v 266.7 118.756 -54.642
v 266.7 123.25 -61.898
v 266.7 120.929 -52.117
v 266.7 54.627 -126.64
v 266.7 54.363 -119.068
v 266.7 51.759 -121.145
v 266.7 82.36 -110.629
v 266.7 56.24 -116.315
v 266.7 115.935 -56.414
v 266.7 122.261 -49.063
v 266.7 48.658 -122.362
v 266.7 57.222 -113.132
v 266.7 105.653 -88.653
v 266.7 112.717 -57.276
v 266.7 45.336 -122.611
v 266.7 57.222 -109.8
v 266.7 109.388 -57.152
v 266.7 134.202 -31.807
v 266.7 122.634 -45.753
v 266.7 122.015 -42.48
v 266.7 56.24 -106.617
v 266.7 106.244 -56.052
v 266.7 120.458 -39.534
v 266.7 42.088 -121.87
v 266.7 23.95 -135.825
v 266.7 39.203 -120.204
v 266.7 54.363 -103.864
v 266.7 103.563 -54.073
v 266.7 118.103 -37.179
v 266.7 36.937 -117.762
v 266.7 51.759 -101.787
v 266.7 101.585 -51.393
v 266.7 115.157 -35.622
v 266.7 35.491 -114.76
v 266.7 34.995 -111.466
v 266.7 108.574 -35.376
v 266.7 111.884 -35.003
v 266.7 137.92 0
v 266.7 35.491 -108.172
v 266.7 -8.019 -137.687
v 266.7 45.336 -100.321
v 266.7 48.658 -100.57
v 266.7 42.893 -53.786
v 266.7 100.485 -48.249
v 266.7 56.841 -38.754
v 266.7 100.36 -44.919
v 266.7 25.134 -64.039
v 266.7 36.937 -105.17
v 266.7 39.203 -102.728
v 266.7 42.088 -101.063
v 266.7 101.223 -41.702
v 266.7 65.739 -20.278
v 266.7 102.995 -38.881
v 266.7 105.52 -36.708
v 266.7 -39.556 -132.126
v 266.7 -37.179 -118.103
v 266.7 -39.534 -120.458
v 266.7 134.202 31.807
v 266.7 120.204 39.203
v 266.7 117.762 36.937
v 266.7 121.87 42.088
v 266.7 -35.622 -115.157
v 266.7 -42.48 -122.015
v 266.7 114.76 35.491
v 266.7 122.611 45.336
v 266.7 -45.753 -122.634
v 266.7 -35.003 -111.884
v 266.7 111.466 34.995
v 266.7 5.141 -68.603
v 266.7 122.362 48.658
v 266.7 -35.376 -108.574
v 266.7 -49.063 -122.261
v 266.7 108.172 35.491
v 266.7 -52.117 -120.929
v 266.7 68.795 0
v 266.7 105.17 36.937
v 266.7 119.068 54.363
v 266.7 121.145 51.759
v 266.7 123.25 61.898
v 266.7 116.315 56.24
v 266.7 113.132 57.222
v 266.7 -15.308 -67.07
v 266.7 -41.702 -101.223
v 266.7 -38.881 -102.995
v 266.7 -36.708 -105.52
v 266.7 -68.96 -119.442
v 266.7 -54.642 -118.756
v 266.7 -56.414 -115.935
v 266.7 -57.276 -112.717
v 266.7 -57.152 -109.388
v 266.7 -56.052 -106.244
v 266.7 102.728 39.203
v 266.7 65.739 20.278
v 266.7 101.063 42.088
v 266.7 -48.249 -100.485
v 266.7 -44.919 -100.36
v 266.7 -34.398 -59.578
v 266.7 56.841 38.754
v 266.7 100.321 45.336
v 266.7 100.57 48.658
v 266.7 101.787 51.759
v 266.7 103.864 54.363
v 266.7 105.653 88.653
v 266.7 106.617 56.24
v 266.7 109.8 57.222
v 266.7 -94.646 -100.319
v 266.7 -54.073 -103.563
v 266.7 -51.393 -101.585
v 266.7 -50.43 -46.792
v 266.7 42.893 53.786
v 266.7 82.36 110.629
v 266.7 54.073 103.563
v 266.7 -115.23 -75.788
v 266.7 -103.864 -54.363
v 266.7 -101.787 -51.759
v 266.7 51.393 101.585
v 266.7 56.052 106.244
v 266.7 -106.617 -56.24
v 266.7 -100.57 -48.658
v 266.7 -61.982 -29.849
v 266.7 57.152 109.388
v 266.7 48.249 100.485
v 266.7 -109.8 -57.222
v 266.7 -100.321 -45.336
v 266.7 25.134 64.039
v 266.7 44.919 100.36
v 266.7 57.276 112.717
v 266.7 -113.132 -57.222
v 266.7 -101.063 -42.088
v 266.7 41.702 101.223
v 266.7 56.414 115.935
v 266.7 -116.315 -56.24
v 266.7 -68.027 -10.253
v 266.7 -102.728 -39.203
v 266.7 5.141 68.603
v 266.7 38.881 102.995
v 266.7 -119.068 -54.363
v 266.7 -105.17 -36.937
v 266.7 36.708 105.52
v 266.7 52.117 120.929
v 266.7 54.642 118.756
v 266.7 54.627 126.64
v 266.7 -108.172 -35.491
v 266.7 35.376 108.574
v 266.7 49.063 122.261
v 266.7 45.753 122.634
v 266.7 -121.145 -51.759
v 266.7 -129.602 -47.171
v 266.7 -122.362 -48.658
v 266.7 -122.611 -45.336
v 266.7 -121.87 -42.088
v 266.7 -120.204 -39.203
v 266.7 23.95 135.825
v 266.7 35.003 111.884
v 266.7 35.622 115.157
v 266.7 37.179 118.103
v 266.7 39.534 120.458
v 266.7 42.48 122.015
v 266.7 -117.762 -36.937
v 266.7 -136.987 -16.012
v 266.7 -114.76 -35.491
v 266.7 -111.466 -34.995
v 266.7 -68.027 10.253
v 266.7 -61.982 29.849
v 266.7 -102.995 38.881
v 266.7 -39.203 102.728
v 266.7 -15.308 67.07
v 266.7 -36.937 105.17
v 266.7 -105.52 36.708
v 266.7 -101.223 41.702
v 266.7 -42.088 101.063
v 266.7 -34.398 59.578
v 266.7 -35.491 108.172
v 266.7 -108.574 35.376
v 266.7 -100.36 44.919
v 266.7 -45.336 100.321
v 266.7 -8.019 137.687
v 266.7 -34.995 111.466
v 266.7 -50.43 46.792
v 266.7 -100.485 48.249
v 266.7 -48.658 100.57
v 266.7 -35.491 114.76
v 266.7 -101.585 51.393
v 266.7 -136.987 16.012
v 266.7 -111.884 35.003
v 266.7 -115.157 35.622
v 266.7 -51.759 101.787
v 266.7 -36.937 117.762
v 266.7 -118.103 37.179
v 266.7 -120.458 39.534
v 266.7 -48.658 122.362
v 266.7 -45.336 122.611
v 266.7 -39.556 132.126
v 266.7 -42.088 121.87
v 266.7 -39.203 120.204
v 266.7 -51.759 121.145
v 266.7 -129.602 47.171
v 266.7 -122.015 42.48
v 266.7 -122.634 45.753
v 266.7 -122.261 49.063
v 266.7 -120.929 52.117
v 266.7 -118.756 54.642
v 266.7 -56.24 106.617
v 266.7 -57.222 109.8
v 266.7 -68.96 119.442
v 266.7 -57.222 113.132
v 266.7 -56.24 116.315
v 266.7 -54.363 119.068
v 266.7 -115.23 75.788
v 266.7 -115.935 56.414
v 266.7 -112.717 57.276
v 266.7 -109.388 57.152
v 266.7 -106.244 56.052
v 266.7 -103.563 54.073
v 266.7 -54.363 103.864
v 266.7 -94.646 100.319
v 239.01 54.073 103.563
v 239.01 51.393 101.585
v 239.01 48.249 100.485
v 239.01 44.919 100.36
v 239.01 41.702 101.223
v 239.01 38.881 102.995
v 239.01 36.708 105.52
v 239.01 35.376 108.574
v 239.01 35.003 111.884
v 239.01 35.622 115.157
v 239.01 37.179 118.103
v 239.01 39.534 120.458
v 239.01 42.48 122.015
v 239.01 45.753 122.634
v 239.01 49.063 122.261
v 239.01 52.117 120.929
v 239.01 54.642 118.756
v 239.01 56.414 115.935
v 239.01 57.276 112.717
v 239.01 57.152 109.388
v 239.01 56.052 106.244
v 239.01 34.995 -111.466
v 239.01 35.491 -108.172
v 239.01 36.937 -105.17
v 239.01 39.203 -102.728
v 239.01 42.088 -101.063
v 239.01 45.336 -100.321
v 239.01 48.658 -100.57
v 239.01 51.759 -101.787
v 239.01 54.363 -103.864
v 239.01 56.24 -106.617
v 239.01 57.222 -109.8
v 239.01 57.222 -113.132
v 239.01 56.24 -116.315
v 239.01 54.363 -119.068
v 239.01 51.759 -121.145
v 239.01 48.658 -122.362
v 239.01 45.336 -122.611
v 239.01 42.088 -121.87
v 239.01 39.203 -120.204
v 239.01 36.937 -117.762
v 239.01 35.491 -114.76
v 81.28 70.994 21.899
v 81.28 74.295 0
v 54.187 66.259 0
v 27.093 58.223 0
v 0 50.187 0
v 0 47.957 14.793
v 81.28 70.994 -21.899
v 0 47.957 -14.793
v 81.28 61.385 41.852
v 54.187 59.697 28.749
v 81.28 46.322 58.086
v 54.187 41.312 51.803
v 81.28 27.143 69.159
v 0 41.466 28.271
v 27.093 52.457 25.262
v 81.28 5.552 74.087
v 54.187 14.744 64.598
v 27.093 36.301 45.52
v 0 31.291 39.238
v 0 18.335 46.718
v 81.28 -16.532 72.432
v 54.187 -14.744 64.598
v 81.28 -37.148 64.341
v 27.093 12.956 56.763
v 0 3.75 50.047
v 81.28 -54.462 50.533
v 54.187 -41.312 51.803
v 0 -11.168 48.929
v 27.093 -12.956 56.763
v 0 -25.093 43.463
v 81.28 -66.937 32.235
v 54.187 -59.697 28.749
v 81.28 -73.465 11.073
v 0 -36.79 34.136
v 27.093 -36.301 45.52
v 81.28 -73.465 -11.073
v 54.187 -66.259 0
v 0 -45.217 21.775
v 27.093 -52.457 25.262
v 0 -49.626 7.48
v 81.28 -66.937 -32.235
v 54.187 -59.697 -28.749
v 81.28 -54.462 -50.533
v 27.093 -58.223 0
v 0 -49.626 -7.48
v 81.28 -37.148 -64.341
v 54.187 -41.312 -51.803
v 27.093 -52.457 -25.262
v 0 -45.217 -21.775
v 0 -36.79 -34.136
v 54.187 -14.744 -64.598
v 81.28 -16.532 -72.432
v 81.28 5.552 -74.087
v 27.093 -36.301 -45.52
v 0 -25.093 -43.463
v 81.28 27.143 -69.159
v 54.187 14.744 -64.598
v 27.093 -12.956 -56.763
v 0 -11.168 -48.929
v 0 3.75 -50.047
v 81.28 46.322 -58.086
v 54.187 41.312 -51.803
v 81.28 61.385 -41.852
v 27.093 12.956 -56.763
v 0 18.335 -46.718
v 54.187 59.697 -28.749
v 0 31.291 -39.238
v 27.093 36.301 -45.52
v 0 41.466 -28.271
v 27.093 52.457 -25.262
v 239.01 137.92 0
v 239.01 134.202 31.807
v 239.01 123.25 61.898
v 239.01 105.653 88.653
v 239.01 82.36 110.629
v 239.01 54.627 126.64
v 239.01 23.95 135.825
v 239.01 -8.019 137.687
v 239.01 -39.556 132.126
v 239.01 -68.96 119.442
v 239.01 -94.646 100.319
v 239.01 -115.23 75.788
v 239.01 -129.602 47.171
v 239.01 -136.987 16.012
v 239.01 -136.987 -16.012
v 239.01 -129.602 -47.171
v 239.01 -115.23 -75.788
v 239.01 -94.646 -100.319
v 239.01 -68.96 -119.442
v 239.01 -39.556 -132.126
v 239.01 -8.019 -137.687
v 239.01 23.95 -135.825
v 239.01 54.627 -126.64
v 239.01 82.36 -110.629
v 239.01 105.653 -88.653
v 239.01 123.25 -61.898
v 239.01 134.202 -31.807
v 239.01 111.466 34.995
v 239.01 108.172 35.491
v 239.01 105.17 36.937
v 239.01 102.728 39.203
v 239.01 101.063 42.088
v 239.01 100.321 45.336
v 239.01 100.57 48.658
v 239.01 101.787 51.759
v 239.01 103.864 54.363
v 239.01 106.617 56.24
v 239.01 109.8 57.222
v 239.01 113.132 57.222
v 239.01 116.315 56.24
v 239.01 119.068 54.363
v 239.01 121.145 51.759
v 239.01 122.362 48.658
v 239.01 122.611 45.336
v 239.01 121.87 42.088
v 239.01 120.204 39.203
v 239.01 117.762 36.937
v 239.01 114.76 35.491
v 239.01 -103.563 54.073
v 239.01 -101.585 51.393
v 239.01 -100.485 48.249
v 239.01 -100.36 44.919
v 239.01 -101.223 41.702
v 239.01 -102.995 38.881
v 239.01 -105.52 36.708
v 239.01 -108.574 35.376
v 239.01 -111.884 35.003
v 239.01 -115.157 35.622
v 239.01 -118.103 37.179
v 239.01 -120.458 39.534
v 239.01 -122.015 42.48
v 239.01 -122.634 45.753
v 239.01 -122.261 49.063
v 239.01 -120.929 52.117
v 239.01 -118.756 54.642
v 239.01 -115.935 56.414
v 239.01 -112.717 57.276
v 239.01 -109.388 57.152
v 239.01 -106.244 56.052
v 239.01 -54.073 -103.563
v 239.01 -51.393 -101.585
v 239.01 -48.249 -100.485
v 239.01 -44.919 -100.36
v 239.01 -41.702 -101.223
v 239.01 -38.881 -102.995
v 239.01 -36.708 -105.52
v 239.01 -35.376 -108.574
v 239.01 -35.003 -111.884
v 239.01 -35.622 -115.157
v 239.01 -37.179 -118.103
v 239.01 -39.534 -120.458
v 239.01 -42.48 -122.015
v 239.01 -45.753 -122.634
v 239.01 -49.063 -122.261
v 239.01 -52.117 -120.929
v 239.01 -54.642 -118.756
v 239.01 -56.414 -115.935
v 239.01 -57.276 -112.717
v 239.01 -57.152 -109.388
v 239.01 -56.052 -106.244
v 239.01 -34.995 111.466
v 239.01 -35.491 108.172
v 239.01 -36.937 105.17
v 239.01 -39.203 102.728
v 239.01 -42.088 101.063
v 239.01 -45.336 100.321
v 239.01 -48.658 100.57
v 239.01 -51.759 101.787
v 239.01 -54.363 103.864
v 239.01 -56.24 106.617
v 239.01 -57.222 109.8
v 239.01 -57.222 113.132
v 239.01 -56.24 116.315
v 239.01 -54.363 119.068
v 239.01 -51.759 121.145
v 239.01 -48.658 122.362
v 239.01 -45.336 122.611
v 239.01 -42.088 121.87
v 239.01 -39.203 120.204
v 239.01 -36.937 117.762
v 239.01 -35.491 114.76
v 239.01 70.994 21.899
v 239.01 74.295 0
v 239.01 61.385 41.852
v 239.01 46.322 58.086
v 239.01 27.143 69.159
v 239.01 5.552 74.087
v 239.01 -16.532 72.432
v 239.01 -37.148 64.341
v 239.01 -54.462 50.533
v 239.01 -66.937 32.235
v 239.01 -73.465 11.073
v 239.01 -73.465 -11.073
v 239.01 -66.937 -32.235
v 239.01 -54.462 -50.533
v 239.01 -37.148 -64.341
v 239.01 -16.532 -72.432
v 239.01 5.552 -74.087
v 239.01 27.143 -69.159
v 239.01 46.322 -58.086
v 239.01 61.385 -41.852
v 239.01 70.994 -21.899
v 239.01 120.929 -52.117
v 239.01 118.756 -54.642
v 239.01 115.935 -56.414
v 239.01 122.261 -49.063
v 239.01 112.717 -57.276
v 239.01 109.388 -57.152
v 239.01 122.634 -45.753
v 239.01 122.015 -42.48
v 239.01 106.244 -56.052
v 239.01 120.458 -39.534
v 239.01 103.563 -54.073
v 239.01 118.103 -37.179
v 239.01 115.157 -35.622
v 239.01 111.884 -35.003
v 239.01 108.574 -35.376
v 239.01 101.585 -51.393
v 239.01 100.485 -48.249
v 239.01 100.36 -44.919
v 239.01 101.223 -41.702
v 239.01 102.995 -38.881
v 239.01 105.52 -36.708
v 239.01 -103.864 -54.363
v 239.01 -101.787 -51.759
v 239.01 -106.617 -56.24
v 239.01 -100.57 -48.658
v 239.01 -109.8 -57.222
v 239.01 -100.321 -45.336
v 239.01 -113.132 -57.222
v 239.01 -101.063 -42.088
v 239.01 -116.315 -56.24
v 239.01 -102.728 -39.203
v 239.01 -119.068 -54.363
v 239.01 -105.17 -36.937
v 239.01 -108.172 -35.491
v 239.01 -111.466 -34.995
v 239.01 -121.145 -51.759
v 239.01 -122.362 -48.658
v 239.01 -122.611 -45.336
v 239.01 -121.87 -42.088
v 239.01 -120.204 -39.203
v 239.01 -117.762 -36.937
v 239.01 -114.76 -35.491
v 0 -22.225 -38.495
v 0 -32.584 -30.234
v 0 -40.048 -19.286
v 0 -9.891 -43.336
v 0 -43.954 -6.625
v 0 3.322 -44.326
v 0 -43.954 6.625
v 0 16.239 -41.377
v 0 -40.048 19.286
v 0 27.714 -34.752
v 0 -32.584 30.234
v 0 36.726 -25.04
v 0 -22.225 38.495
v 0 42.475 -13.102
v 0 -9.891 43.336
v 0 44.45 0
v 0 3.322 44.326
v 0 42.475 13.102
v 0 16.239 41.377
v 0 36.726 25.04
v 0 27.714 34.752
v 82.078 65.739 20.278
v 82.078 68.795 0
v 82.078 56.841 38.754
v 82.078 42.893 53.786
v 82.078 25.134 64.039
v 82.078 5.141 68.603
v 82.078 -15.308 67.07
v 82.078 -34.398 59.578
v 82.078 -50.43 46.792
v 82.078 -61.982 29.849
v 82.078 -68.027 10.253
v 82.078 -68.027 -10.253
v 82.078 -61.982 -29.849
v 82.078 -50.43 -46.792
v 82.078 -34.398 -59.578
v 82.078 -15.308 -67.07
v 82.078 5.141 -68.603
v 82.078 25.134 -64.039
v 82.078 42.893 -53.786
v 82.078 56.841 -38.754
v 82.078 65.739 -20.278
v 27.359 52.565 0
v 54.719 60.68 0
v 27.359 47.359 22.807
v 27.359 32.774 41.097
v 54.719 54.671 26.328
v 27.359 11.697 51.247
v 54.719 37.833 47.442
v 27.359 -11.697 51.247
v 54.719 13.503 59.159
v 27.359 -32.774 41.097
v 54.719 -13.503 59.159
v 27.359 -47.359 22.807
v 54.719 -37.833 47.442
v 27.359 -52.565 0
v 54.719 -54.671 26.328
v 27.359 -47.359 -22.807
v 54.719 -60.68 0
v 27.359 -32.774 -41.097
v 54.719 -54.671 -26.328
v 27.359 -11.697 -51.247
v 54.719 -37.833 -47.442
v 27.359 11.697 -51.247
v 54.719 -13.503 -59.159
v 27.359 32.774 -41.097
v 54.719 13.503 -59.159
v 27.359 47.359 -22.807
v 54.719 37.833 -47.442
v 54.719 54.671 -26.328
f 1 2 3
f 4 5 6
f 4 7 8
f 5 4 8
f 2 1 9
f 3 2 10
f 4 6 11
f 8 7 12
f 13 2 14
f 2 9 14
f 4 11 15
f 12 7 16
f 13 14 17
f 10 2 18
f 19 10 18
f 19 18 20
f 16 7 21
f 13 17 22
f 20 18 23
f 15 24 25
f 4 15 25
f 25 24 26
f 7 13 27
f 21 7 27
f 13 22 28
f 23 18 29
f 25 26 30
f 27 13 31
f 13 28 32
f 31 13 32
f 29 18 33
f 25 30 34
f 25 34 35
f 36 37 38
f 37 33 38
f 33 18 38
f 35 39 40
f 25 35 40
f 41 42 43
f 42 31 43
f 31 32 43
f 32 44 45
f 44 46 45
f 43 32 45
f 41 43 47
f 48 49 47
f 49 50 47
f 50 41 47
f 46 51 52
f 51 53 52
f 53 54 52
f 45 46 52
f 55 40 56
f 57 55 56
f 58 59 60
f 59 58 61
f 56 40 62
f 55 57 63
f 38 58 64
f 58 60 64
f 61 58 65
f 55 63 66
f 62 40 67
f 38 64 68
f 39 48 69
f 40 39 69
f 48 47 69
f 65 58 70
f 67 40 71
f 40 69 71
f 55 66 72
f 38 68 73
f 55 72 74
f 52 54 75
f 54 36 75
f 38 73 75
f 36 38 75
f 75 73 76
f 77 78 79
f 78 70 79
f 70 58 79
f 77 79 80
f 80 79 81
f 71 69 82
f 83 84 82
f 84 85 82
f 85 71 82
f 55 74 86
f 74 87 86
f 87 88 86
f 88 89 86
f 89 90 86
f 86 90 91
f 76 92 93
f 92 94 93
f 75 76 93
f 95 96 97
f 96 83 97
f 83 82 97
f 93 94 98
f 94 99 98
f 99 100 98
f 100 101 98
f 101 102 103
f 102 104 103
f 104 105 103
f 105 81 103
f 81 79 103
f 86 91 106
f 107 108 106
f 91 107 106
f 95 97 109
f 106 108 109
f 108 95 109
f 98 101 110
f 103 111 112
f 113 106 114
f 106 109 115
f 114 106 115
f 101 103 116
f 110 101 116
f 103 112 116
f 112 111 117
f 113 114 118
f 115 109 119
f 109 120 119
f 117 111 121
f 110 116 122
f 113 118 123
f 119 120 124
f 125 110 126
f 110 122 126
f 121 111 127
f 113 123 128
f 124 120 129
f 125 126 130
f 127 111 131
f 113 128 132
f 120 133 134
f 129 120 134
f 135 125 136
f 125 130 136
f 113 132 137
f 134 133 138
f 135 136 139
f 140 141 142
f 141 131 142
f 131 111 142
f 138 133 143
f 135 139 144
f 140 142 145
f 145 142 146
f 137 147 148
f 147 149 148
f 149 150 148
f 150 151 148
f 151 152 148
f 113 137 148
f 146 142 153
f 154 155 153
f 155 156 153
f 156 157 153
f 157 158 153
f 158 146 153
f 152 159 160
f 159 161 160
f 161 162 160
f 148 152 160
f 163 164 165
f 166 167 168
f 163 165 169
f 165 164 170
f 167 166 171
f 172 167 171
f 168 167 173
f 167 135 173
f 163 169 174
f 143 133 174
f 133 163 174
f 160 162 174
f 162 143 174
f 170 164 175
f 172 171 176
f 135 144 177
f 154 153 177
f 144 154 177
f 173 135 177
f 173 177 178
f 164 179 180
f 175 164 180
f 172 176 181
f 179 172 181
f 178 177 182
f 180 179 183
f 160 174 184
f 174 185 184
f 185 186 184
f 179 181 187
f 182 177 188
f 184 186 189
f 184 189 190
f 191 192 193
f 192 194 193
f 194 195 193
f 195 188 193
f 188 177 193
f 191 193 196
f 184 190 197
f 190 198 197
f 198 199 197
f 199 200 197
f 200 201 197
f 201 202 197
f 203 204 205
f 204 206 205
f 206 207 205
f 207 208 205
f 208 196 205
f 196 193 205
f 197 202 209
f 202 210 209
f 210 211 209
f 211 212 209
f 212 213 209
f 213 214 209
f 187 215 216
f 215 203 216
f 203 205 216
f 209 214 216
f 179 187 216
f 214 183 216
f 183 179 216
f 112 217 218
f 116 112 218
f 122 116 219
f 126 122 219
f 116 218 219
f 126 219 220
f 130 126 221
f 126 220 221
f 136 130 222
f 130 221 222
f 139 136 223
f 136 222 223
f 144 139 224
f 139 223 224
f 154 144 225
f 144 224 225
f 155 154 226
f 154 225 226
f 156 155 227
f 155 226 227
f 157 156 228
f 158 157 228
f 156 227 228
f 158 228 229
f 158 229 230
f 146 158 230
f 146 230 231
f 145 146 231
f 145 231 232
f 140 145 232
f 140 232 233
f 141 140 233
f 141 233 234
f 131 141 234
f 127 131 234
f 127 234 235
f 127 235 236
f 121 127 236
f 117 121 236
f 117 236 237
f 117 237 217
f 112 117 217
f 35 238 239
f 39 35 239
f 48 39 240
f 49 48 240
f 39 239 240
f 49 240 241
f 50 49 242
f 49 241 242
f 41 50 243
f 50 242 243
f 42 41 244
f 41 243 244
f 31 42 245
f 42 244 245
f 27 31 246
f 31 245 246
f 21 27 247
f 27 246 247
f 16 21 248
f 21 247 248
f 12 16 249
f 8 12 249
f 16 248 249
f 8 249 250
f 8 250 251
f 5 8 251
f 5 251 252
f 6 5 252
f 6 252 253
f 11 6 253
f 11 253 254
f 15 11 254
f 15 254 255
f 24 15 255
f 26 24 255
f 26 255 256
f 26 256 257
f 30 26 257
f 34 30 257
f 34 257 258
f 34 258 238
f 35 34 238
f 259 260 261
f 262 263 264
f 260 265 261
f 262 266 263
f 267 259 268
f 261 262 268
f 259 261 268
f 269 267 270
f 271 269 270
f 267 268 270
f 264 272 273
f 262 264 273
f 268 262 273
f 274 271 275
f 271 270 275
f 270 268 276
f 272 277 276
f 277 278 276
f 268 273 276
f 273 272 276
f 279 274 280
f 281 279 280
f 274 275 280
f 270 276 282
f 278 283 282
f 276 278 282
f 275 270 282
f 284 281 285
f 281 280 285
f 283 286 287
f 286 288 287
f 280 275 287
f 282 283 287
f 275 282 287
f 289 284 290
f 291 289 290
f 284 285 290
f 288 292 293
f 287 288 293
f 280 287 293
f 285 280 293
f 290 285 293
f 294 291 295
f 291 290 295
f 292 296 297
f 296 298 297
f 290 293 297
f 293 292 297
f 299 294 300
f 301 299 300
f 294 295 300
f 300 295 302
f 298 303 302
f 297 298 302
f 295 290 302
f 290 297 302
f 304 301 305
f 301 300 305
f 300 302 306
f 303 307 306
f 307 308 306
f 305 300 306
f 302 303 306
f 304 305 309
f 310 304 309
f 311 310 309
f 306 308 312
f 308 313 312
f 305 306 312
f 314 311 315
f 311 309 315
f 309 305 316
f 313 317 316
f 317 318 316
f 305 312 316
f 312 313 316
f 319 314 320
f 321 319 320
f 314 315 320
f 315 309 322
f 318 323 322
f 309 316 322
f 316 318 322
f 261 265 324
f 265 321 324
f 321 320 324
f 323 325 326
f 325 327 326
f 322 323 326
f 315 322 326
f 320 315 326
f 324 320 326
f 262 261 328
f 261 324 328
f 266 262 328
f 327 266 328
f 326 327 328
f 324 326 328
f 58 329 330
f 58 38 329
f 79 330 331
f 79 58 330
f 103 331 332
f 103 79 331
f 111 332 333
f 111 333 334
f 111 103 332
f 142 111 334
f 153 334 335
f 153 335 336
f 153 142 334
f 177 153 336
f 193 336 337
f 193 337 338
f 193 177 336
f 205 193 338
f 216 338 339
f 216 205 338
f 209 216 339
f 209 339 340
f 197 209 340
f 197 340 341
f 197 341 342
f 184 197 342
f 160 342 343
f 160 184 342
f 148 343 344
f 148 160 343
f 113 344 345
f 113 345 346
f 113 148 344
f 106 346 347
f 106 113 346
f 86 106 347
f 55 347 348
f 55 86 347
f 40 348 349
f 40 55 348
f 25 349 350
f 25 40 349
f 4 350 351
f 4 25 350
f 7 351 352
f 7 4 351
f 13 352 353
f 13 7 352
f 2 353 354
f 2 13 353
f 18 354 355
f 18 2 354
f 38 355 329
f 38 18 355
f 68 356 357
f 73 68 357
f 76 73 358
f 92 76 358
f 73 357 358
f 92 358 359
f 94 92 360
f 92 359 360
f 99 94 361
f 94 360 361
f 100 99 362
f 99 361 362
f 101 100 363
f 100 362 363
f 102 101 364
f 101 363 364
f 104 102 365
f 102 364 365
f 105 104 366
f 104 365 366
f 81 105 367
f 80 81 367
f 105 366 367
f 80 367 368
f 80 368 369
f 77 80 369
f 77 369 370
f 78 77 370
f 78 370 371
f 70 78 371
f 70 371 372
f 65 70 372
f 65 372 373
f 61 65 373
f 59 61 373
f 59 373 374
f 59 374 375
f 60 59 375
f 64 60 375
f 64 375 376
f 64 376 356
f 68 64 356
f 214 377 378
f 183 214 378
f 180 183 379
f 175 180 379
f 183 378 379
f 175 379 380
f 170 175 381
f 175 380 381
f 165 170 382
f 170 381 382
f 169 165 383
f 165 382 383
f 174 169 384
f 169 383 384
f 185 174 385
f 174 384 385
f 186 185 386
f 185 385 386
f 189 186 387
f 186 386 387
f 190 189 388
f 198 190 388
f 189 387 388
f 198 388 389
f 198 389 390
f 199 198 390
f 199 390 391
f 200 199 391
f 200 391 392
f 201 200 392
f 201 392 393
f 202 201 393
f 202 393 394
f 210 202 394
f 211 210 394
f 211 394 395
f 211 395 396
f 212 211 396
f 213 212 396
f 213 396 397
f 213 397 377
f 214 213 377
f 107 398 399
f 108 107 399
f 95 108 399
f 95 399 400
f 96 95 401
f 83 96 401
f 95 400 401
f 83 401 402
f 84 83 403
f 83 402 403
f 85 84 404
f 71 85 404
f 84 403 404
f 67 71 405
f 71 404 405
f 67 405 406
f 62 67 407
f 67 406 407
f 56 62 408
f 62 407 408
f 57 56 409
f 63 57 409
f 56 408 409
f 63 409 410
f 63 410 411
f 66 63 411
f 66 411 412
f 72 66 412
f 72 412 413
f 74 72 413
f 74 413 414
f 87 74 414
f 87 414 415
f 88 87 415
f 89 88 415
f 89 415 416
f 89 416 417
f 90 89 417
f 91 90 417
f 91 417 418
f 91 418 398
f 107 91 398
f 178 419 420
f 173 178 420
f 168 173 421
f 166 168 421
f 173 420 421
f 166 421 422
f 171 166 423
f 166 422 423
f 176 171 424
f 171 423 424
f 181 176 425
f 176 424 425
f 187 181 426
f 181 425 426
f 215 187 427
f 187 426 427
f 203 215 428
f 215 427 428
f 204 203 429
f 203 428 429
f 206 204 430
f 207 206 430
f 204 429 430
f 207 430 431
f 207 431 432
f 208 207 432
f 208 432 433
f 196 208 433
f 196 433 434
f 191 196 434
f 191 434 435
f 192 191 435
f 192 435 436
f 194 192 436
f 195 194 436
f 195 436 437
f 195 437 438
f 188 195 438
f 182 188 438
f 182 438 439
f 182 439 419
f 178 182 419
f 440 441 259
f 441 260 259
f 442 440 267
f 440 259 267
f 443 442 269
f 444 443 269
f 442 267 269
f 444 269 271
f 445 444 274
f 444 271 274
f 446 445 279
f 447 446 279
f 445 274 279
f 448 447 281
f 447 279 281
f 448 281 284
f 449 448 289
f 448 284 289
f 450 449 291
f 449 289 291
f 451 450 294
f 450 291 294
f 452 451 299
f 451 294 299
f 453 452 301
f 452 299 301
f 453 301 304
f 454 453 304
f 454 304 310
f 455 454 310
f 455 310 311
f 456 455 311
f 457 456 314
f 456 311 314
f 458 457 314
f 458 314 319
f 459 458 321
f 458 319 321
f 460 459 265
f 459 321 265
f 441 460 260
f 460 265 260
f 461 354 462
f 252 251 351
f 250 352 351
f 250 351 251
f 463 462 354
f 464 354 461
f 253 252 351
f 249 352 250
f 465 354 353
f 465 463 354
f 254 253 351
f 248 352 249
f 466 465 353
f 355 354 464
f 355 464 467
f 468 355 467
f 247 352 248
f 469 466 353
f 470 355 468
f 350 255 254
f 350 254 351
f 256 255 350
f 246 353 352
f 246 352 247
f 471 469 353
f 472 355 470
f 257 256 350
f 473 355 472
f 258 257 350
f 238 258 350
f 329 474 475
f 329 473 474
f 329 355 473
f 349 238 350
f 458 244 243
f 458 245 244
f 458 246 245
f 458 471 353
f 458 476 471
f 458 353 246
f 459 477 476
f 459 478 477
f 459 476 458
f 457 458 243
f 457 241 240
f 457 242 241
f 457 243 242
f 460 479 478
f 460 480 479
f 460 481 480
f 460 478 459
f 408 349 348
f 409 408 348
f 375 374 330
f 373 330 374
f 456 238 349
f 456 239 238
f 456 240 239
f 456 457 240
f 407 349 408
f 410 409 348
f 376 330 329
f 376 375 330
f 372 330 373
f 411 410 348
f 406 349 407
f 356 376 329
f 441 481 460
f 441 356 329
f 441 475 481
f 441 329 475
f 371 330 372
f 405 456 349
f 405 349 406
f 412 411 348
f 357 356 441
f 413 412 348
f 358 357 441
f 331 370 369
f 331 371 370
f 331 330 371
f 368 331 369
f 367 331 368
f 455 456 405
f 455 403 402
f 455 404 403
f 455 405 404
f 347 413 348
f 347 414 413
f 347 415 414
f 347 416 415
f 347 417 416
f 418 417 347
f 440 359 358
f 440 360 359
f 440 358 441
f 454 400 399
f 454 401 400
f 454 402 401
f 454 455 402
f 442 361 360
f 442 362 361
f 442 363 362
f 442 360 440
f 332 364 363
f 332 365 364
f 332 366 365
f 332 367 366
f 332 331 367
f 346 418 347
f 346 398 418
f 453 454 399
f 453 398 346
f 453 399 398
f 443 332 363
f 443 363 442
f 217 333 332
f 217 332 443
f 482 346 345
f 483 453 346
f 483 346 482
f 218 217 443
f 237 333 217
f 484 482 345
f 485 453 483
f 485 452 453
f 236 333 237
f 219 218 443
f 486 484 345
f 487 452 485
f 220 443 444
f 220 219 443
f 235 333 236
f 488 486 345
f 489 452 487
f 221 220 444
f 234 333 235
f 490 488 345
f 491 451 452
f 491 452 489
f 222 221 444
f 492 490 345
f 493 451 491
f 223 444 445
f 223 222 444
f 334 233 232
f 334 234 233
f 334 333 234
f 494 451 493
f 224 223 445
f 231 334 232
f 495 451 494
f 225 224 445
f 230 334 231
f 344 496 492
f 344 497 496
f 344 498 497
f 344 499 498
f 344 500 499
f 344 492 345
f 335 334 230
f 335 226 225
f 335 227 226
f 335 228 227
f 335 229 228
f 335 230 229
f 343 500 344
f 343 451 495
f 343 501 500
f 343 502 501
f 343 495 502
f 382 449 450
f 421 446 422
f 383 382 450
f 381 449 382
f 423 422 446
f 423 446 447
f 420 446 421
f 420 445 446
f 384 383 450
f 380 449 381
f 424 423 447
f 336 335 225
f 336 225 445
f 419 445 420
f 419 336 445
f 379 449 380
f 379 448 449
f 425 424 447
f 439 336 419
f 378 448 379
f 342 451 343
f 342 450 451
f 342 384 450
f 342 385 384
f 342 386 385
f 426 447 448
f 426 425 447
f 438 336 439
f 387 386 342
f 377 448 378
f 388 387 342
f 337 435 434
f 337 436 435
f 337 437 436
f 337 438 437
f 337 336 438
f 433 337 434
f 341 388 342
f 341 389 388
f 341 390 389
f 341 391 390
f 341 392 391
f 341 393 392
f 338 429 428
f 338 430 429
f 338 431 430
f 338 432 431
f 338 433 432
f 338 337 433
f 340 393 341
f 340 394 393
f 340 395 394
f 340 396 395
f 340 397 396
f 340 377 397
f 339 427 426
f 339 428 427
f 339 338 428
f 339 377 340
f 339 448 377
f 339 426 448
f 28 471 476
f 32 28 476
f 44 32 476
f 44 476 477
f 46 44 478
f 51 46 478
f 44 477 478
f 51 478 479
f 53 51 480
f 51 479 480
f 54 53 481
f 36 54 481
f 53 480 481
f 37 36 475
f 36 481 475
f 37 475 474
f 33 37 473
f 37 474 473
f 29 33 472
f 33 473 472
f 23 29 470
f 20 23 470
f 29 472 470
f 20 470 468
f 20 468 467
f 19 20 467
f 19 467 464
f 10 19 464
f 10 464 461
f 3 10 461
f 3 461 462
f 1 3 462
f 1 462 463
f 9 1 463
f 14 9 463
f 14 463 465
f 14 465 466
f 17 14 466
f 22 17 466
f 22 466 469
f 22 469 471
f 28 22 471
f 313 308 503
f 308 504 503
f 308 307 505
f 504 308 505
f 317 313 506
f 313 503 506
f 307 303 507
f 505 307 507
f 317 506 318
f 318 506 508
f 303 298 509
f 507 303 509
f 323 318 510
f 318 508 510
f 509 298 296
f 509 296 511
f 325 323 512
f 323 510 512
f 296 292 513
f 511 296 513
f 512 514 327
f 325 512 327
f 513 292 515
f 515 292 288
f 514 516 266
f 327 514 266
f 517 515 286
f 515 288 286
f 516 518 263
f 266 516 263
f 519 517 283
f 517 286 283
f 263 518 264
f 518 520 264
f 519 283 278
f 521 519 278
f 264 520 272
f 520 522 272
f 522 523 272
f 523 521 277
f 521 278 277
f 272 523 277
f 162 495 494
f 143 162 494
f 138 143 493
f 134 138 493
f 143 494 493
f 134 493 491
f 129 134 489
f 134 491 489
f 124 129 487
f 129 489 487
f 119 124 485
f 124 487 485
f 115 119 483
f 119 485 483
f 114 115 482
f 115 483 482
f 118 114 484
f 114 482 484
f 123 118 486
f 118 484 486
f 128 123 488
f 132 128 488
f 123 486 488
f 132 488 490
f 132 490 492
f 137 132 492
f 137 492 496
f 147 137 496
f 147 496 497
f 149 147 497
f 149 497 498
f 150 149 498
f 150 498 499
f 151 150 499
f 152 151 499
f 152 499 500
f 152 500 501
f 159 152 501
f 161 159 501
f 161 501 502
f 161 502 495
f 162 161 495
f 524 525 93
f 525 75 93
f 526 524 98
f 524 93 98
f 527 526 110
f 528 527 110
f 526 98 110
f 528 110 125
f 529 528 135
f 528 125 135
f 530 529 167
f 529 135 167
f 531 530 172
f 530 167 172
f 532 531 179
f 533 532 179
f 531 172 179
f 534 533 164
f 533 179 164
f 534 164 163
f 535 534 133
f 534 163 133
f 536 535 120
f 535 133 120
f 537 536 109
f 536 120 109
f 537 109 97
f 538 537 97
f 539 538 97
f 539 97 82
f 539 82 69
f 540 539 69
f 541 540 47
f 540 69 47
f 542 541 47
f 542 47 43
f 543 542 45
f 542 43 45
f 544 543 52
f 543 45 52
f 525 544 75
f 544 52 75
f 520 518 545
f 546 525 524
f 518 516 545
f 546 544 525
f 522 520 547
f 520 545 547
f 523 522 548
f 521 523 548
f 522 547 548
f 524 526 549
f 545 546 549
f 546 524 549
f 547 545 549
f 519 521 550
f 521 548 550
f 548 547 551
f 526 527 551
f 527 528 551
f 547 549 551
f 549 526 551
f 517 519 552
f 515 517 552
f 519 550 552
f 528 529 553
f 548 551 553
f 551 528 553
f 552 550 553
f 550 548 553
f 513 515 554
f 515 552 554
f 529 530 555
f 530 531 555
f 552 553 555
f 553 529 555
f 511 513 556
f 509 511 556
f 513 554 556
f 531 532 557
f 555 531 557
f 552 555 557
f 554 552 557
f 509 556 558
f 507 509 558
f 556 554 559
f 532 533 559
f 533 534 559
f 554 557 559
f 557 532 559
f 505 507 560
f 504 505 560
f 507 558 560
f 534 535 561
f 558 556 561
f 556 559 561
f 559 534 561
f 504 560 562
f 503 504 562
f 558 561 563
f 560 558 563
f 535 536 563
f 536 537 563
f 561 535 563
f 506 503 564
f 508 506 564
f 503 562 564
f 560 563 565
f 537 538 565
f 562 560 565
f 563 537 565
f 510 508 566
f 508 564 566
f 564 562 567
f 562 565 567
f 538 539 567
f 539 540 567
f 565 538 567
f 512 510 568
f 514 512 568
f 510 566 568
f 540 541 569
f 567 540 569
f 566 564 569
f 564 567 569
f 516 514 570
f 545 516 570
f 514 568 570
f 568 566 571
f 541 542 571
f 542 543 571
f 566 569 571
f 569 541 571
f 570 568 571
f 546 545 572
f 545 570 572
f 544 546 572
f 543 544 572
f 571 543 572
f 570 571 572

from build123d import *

# Parameters (mm, degrees)
SKETCH1_W                   = 27.69
SKETCH1_H                   = 63.625
F_7_8_0_88_DIAMETER_HOLE1_D = 22.352
CIRPATTERN1_COUNT           = 8


with BuildPart() as part:
    # Sketch1 → Revolve1 (revolve)
    with BuildSketch(Plane.XY):
        Polygon((239.01, 68.795), (266.7, 68.795), (266.7, 74.295), (239.01, 74.295), (81.28, 74.295), (0, 50.18683312), (0, 44.45), (82.078476138, 68.795), align=None)
        with Locations((252.855, 106.1075)):
            Rectangle(SKETCH1_W, SKETCH1_H)
    revolve(axis=Axis((0, 0, 0), (1, 0, 0)))

    # 7/8 (0.88) Diameter Hole1 (through all)
    with Locations(Plane(origin=(266.7, 111.466065597, 46.170756115), x_dir=(0, 0, 1), z_dir=(1, 0, 0))):
        with Locations((0, 0)):
            f_7_8_0_88_diameter_hole1 = Hole(F_7_8_0_88_DIAMETER_HOLE1_D / 2)

    # CirPattern1: 7/8 (0.88) Diameter Hole1 ×8 about axis
    cirpattern1_axis = Axis((0, 0, 0), (1, 0, 0))
    for i in range(1, CIRPATTERN1_COUNT):
        add(f_7_8_0_88_diameter_hole1.rotate(cirpattern1_axis, i * 360 / CIRPATTERN1_COUNT), mode=Mode.SUBTRACT)


solid = part.part
